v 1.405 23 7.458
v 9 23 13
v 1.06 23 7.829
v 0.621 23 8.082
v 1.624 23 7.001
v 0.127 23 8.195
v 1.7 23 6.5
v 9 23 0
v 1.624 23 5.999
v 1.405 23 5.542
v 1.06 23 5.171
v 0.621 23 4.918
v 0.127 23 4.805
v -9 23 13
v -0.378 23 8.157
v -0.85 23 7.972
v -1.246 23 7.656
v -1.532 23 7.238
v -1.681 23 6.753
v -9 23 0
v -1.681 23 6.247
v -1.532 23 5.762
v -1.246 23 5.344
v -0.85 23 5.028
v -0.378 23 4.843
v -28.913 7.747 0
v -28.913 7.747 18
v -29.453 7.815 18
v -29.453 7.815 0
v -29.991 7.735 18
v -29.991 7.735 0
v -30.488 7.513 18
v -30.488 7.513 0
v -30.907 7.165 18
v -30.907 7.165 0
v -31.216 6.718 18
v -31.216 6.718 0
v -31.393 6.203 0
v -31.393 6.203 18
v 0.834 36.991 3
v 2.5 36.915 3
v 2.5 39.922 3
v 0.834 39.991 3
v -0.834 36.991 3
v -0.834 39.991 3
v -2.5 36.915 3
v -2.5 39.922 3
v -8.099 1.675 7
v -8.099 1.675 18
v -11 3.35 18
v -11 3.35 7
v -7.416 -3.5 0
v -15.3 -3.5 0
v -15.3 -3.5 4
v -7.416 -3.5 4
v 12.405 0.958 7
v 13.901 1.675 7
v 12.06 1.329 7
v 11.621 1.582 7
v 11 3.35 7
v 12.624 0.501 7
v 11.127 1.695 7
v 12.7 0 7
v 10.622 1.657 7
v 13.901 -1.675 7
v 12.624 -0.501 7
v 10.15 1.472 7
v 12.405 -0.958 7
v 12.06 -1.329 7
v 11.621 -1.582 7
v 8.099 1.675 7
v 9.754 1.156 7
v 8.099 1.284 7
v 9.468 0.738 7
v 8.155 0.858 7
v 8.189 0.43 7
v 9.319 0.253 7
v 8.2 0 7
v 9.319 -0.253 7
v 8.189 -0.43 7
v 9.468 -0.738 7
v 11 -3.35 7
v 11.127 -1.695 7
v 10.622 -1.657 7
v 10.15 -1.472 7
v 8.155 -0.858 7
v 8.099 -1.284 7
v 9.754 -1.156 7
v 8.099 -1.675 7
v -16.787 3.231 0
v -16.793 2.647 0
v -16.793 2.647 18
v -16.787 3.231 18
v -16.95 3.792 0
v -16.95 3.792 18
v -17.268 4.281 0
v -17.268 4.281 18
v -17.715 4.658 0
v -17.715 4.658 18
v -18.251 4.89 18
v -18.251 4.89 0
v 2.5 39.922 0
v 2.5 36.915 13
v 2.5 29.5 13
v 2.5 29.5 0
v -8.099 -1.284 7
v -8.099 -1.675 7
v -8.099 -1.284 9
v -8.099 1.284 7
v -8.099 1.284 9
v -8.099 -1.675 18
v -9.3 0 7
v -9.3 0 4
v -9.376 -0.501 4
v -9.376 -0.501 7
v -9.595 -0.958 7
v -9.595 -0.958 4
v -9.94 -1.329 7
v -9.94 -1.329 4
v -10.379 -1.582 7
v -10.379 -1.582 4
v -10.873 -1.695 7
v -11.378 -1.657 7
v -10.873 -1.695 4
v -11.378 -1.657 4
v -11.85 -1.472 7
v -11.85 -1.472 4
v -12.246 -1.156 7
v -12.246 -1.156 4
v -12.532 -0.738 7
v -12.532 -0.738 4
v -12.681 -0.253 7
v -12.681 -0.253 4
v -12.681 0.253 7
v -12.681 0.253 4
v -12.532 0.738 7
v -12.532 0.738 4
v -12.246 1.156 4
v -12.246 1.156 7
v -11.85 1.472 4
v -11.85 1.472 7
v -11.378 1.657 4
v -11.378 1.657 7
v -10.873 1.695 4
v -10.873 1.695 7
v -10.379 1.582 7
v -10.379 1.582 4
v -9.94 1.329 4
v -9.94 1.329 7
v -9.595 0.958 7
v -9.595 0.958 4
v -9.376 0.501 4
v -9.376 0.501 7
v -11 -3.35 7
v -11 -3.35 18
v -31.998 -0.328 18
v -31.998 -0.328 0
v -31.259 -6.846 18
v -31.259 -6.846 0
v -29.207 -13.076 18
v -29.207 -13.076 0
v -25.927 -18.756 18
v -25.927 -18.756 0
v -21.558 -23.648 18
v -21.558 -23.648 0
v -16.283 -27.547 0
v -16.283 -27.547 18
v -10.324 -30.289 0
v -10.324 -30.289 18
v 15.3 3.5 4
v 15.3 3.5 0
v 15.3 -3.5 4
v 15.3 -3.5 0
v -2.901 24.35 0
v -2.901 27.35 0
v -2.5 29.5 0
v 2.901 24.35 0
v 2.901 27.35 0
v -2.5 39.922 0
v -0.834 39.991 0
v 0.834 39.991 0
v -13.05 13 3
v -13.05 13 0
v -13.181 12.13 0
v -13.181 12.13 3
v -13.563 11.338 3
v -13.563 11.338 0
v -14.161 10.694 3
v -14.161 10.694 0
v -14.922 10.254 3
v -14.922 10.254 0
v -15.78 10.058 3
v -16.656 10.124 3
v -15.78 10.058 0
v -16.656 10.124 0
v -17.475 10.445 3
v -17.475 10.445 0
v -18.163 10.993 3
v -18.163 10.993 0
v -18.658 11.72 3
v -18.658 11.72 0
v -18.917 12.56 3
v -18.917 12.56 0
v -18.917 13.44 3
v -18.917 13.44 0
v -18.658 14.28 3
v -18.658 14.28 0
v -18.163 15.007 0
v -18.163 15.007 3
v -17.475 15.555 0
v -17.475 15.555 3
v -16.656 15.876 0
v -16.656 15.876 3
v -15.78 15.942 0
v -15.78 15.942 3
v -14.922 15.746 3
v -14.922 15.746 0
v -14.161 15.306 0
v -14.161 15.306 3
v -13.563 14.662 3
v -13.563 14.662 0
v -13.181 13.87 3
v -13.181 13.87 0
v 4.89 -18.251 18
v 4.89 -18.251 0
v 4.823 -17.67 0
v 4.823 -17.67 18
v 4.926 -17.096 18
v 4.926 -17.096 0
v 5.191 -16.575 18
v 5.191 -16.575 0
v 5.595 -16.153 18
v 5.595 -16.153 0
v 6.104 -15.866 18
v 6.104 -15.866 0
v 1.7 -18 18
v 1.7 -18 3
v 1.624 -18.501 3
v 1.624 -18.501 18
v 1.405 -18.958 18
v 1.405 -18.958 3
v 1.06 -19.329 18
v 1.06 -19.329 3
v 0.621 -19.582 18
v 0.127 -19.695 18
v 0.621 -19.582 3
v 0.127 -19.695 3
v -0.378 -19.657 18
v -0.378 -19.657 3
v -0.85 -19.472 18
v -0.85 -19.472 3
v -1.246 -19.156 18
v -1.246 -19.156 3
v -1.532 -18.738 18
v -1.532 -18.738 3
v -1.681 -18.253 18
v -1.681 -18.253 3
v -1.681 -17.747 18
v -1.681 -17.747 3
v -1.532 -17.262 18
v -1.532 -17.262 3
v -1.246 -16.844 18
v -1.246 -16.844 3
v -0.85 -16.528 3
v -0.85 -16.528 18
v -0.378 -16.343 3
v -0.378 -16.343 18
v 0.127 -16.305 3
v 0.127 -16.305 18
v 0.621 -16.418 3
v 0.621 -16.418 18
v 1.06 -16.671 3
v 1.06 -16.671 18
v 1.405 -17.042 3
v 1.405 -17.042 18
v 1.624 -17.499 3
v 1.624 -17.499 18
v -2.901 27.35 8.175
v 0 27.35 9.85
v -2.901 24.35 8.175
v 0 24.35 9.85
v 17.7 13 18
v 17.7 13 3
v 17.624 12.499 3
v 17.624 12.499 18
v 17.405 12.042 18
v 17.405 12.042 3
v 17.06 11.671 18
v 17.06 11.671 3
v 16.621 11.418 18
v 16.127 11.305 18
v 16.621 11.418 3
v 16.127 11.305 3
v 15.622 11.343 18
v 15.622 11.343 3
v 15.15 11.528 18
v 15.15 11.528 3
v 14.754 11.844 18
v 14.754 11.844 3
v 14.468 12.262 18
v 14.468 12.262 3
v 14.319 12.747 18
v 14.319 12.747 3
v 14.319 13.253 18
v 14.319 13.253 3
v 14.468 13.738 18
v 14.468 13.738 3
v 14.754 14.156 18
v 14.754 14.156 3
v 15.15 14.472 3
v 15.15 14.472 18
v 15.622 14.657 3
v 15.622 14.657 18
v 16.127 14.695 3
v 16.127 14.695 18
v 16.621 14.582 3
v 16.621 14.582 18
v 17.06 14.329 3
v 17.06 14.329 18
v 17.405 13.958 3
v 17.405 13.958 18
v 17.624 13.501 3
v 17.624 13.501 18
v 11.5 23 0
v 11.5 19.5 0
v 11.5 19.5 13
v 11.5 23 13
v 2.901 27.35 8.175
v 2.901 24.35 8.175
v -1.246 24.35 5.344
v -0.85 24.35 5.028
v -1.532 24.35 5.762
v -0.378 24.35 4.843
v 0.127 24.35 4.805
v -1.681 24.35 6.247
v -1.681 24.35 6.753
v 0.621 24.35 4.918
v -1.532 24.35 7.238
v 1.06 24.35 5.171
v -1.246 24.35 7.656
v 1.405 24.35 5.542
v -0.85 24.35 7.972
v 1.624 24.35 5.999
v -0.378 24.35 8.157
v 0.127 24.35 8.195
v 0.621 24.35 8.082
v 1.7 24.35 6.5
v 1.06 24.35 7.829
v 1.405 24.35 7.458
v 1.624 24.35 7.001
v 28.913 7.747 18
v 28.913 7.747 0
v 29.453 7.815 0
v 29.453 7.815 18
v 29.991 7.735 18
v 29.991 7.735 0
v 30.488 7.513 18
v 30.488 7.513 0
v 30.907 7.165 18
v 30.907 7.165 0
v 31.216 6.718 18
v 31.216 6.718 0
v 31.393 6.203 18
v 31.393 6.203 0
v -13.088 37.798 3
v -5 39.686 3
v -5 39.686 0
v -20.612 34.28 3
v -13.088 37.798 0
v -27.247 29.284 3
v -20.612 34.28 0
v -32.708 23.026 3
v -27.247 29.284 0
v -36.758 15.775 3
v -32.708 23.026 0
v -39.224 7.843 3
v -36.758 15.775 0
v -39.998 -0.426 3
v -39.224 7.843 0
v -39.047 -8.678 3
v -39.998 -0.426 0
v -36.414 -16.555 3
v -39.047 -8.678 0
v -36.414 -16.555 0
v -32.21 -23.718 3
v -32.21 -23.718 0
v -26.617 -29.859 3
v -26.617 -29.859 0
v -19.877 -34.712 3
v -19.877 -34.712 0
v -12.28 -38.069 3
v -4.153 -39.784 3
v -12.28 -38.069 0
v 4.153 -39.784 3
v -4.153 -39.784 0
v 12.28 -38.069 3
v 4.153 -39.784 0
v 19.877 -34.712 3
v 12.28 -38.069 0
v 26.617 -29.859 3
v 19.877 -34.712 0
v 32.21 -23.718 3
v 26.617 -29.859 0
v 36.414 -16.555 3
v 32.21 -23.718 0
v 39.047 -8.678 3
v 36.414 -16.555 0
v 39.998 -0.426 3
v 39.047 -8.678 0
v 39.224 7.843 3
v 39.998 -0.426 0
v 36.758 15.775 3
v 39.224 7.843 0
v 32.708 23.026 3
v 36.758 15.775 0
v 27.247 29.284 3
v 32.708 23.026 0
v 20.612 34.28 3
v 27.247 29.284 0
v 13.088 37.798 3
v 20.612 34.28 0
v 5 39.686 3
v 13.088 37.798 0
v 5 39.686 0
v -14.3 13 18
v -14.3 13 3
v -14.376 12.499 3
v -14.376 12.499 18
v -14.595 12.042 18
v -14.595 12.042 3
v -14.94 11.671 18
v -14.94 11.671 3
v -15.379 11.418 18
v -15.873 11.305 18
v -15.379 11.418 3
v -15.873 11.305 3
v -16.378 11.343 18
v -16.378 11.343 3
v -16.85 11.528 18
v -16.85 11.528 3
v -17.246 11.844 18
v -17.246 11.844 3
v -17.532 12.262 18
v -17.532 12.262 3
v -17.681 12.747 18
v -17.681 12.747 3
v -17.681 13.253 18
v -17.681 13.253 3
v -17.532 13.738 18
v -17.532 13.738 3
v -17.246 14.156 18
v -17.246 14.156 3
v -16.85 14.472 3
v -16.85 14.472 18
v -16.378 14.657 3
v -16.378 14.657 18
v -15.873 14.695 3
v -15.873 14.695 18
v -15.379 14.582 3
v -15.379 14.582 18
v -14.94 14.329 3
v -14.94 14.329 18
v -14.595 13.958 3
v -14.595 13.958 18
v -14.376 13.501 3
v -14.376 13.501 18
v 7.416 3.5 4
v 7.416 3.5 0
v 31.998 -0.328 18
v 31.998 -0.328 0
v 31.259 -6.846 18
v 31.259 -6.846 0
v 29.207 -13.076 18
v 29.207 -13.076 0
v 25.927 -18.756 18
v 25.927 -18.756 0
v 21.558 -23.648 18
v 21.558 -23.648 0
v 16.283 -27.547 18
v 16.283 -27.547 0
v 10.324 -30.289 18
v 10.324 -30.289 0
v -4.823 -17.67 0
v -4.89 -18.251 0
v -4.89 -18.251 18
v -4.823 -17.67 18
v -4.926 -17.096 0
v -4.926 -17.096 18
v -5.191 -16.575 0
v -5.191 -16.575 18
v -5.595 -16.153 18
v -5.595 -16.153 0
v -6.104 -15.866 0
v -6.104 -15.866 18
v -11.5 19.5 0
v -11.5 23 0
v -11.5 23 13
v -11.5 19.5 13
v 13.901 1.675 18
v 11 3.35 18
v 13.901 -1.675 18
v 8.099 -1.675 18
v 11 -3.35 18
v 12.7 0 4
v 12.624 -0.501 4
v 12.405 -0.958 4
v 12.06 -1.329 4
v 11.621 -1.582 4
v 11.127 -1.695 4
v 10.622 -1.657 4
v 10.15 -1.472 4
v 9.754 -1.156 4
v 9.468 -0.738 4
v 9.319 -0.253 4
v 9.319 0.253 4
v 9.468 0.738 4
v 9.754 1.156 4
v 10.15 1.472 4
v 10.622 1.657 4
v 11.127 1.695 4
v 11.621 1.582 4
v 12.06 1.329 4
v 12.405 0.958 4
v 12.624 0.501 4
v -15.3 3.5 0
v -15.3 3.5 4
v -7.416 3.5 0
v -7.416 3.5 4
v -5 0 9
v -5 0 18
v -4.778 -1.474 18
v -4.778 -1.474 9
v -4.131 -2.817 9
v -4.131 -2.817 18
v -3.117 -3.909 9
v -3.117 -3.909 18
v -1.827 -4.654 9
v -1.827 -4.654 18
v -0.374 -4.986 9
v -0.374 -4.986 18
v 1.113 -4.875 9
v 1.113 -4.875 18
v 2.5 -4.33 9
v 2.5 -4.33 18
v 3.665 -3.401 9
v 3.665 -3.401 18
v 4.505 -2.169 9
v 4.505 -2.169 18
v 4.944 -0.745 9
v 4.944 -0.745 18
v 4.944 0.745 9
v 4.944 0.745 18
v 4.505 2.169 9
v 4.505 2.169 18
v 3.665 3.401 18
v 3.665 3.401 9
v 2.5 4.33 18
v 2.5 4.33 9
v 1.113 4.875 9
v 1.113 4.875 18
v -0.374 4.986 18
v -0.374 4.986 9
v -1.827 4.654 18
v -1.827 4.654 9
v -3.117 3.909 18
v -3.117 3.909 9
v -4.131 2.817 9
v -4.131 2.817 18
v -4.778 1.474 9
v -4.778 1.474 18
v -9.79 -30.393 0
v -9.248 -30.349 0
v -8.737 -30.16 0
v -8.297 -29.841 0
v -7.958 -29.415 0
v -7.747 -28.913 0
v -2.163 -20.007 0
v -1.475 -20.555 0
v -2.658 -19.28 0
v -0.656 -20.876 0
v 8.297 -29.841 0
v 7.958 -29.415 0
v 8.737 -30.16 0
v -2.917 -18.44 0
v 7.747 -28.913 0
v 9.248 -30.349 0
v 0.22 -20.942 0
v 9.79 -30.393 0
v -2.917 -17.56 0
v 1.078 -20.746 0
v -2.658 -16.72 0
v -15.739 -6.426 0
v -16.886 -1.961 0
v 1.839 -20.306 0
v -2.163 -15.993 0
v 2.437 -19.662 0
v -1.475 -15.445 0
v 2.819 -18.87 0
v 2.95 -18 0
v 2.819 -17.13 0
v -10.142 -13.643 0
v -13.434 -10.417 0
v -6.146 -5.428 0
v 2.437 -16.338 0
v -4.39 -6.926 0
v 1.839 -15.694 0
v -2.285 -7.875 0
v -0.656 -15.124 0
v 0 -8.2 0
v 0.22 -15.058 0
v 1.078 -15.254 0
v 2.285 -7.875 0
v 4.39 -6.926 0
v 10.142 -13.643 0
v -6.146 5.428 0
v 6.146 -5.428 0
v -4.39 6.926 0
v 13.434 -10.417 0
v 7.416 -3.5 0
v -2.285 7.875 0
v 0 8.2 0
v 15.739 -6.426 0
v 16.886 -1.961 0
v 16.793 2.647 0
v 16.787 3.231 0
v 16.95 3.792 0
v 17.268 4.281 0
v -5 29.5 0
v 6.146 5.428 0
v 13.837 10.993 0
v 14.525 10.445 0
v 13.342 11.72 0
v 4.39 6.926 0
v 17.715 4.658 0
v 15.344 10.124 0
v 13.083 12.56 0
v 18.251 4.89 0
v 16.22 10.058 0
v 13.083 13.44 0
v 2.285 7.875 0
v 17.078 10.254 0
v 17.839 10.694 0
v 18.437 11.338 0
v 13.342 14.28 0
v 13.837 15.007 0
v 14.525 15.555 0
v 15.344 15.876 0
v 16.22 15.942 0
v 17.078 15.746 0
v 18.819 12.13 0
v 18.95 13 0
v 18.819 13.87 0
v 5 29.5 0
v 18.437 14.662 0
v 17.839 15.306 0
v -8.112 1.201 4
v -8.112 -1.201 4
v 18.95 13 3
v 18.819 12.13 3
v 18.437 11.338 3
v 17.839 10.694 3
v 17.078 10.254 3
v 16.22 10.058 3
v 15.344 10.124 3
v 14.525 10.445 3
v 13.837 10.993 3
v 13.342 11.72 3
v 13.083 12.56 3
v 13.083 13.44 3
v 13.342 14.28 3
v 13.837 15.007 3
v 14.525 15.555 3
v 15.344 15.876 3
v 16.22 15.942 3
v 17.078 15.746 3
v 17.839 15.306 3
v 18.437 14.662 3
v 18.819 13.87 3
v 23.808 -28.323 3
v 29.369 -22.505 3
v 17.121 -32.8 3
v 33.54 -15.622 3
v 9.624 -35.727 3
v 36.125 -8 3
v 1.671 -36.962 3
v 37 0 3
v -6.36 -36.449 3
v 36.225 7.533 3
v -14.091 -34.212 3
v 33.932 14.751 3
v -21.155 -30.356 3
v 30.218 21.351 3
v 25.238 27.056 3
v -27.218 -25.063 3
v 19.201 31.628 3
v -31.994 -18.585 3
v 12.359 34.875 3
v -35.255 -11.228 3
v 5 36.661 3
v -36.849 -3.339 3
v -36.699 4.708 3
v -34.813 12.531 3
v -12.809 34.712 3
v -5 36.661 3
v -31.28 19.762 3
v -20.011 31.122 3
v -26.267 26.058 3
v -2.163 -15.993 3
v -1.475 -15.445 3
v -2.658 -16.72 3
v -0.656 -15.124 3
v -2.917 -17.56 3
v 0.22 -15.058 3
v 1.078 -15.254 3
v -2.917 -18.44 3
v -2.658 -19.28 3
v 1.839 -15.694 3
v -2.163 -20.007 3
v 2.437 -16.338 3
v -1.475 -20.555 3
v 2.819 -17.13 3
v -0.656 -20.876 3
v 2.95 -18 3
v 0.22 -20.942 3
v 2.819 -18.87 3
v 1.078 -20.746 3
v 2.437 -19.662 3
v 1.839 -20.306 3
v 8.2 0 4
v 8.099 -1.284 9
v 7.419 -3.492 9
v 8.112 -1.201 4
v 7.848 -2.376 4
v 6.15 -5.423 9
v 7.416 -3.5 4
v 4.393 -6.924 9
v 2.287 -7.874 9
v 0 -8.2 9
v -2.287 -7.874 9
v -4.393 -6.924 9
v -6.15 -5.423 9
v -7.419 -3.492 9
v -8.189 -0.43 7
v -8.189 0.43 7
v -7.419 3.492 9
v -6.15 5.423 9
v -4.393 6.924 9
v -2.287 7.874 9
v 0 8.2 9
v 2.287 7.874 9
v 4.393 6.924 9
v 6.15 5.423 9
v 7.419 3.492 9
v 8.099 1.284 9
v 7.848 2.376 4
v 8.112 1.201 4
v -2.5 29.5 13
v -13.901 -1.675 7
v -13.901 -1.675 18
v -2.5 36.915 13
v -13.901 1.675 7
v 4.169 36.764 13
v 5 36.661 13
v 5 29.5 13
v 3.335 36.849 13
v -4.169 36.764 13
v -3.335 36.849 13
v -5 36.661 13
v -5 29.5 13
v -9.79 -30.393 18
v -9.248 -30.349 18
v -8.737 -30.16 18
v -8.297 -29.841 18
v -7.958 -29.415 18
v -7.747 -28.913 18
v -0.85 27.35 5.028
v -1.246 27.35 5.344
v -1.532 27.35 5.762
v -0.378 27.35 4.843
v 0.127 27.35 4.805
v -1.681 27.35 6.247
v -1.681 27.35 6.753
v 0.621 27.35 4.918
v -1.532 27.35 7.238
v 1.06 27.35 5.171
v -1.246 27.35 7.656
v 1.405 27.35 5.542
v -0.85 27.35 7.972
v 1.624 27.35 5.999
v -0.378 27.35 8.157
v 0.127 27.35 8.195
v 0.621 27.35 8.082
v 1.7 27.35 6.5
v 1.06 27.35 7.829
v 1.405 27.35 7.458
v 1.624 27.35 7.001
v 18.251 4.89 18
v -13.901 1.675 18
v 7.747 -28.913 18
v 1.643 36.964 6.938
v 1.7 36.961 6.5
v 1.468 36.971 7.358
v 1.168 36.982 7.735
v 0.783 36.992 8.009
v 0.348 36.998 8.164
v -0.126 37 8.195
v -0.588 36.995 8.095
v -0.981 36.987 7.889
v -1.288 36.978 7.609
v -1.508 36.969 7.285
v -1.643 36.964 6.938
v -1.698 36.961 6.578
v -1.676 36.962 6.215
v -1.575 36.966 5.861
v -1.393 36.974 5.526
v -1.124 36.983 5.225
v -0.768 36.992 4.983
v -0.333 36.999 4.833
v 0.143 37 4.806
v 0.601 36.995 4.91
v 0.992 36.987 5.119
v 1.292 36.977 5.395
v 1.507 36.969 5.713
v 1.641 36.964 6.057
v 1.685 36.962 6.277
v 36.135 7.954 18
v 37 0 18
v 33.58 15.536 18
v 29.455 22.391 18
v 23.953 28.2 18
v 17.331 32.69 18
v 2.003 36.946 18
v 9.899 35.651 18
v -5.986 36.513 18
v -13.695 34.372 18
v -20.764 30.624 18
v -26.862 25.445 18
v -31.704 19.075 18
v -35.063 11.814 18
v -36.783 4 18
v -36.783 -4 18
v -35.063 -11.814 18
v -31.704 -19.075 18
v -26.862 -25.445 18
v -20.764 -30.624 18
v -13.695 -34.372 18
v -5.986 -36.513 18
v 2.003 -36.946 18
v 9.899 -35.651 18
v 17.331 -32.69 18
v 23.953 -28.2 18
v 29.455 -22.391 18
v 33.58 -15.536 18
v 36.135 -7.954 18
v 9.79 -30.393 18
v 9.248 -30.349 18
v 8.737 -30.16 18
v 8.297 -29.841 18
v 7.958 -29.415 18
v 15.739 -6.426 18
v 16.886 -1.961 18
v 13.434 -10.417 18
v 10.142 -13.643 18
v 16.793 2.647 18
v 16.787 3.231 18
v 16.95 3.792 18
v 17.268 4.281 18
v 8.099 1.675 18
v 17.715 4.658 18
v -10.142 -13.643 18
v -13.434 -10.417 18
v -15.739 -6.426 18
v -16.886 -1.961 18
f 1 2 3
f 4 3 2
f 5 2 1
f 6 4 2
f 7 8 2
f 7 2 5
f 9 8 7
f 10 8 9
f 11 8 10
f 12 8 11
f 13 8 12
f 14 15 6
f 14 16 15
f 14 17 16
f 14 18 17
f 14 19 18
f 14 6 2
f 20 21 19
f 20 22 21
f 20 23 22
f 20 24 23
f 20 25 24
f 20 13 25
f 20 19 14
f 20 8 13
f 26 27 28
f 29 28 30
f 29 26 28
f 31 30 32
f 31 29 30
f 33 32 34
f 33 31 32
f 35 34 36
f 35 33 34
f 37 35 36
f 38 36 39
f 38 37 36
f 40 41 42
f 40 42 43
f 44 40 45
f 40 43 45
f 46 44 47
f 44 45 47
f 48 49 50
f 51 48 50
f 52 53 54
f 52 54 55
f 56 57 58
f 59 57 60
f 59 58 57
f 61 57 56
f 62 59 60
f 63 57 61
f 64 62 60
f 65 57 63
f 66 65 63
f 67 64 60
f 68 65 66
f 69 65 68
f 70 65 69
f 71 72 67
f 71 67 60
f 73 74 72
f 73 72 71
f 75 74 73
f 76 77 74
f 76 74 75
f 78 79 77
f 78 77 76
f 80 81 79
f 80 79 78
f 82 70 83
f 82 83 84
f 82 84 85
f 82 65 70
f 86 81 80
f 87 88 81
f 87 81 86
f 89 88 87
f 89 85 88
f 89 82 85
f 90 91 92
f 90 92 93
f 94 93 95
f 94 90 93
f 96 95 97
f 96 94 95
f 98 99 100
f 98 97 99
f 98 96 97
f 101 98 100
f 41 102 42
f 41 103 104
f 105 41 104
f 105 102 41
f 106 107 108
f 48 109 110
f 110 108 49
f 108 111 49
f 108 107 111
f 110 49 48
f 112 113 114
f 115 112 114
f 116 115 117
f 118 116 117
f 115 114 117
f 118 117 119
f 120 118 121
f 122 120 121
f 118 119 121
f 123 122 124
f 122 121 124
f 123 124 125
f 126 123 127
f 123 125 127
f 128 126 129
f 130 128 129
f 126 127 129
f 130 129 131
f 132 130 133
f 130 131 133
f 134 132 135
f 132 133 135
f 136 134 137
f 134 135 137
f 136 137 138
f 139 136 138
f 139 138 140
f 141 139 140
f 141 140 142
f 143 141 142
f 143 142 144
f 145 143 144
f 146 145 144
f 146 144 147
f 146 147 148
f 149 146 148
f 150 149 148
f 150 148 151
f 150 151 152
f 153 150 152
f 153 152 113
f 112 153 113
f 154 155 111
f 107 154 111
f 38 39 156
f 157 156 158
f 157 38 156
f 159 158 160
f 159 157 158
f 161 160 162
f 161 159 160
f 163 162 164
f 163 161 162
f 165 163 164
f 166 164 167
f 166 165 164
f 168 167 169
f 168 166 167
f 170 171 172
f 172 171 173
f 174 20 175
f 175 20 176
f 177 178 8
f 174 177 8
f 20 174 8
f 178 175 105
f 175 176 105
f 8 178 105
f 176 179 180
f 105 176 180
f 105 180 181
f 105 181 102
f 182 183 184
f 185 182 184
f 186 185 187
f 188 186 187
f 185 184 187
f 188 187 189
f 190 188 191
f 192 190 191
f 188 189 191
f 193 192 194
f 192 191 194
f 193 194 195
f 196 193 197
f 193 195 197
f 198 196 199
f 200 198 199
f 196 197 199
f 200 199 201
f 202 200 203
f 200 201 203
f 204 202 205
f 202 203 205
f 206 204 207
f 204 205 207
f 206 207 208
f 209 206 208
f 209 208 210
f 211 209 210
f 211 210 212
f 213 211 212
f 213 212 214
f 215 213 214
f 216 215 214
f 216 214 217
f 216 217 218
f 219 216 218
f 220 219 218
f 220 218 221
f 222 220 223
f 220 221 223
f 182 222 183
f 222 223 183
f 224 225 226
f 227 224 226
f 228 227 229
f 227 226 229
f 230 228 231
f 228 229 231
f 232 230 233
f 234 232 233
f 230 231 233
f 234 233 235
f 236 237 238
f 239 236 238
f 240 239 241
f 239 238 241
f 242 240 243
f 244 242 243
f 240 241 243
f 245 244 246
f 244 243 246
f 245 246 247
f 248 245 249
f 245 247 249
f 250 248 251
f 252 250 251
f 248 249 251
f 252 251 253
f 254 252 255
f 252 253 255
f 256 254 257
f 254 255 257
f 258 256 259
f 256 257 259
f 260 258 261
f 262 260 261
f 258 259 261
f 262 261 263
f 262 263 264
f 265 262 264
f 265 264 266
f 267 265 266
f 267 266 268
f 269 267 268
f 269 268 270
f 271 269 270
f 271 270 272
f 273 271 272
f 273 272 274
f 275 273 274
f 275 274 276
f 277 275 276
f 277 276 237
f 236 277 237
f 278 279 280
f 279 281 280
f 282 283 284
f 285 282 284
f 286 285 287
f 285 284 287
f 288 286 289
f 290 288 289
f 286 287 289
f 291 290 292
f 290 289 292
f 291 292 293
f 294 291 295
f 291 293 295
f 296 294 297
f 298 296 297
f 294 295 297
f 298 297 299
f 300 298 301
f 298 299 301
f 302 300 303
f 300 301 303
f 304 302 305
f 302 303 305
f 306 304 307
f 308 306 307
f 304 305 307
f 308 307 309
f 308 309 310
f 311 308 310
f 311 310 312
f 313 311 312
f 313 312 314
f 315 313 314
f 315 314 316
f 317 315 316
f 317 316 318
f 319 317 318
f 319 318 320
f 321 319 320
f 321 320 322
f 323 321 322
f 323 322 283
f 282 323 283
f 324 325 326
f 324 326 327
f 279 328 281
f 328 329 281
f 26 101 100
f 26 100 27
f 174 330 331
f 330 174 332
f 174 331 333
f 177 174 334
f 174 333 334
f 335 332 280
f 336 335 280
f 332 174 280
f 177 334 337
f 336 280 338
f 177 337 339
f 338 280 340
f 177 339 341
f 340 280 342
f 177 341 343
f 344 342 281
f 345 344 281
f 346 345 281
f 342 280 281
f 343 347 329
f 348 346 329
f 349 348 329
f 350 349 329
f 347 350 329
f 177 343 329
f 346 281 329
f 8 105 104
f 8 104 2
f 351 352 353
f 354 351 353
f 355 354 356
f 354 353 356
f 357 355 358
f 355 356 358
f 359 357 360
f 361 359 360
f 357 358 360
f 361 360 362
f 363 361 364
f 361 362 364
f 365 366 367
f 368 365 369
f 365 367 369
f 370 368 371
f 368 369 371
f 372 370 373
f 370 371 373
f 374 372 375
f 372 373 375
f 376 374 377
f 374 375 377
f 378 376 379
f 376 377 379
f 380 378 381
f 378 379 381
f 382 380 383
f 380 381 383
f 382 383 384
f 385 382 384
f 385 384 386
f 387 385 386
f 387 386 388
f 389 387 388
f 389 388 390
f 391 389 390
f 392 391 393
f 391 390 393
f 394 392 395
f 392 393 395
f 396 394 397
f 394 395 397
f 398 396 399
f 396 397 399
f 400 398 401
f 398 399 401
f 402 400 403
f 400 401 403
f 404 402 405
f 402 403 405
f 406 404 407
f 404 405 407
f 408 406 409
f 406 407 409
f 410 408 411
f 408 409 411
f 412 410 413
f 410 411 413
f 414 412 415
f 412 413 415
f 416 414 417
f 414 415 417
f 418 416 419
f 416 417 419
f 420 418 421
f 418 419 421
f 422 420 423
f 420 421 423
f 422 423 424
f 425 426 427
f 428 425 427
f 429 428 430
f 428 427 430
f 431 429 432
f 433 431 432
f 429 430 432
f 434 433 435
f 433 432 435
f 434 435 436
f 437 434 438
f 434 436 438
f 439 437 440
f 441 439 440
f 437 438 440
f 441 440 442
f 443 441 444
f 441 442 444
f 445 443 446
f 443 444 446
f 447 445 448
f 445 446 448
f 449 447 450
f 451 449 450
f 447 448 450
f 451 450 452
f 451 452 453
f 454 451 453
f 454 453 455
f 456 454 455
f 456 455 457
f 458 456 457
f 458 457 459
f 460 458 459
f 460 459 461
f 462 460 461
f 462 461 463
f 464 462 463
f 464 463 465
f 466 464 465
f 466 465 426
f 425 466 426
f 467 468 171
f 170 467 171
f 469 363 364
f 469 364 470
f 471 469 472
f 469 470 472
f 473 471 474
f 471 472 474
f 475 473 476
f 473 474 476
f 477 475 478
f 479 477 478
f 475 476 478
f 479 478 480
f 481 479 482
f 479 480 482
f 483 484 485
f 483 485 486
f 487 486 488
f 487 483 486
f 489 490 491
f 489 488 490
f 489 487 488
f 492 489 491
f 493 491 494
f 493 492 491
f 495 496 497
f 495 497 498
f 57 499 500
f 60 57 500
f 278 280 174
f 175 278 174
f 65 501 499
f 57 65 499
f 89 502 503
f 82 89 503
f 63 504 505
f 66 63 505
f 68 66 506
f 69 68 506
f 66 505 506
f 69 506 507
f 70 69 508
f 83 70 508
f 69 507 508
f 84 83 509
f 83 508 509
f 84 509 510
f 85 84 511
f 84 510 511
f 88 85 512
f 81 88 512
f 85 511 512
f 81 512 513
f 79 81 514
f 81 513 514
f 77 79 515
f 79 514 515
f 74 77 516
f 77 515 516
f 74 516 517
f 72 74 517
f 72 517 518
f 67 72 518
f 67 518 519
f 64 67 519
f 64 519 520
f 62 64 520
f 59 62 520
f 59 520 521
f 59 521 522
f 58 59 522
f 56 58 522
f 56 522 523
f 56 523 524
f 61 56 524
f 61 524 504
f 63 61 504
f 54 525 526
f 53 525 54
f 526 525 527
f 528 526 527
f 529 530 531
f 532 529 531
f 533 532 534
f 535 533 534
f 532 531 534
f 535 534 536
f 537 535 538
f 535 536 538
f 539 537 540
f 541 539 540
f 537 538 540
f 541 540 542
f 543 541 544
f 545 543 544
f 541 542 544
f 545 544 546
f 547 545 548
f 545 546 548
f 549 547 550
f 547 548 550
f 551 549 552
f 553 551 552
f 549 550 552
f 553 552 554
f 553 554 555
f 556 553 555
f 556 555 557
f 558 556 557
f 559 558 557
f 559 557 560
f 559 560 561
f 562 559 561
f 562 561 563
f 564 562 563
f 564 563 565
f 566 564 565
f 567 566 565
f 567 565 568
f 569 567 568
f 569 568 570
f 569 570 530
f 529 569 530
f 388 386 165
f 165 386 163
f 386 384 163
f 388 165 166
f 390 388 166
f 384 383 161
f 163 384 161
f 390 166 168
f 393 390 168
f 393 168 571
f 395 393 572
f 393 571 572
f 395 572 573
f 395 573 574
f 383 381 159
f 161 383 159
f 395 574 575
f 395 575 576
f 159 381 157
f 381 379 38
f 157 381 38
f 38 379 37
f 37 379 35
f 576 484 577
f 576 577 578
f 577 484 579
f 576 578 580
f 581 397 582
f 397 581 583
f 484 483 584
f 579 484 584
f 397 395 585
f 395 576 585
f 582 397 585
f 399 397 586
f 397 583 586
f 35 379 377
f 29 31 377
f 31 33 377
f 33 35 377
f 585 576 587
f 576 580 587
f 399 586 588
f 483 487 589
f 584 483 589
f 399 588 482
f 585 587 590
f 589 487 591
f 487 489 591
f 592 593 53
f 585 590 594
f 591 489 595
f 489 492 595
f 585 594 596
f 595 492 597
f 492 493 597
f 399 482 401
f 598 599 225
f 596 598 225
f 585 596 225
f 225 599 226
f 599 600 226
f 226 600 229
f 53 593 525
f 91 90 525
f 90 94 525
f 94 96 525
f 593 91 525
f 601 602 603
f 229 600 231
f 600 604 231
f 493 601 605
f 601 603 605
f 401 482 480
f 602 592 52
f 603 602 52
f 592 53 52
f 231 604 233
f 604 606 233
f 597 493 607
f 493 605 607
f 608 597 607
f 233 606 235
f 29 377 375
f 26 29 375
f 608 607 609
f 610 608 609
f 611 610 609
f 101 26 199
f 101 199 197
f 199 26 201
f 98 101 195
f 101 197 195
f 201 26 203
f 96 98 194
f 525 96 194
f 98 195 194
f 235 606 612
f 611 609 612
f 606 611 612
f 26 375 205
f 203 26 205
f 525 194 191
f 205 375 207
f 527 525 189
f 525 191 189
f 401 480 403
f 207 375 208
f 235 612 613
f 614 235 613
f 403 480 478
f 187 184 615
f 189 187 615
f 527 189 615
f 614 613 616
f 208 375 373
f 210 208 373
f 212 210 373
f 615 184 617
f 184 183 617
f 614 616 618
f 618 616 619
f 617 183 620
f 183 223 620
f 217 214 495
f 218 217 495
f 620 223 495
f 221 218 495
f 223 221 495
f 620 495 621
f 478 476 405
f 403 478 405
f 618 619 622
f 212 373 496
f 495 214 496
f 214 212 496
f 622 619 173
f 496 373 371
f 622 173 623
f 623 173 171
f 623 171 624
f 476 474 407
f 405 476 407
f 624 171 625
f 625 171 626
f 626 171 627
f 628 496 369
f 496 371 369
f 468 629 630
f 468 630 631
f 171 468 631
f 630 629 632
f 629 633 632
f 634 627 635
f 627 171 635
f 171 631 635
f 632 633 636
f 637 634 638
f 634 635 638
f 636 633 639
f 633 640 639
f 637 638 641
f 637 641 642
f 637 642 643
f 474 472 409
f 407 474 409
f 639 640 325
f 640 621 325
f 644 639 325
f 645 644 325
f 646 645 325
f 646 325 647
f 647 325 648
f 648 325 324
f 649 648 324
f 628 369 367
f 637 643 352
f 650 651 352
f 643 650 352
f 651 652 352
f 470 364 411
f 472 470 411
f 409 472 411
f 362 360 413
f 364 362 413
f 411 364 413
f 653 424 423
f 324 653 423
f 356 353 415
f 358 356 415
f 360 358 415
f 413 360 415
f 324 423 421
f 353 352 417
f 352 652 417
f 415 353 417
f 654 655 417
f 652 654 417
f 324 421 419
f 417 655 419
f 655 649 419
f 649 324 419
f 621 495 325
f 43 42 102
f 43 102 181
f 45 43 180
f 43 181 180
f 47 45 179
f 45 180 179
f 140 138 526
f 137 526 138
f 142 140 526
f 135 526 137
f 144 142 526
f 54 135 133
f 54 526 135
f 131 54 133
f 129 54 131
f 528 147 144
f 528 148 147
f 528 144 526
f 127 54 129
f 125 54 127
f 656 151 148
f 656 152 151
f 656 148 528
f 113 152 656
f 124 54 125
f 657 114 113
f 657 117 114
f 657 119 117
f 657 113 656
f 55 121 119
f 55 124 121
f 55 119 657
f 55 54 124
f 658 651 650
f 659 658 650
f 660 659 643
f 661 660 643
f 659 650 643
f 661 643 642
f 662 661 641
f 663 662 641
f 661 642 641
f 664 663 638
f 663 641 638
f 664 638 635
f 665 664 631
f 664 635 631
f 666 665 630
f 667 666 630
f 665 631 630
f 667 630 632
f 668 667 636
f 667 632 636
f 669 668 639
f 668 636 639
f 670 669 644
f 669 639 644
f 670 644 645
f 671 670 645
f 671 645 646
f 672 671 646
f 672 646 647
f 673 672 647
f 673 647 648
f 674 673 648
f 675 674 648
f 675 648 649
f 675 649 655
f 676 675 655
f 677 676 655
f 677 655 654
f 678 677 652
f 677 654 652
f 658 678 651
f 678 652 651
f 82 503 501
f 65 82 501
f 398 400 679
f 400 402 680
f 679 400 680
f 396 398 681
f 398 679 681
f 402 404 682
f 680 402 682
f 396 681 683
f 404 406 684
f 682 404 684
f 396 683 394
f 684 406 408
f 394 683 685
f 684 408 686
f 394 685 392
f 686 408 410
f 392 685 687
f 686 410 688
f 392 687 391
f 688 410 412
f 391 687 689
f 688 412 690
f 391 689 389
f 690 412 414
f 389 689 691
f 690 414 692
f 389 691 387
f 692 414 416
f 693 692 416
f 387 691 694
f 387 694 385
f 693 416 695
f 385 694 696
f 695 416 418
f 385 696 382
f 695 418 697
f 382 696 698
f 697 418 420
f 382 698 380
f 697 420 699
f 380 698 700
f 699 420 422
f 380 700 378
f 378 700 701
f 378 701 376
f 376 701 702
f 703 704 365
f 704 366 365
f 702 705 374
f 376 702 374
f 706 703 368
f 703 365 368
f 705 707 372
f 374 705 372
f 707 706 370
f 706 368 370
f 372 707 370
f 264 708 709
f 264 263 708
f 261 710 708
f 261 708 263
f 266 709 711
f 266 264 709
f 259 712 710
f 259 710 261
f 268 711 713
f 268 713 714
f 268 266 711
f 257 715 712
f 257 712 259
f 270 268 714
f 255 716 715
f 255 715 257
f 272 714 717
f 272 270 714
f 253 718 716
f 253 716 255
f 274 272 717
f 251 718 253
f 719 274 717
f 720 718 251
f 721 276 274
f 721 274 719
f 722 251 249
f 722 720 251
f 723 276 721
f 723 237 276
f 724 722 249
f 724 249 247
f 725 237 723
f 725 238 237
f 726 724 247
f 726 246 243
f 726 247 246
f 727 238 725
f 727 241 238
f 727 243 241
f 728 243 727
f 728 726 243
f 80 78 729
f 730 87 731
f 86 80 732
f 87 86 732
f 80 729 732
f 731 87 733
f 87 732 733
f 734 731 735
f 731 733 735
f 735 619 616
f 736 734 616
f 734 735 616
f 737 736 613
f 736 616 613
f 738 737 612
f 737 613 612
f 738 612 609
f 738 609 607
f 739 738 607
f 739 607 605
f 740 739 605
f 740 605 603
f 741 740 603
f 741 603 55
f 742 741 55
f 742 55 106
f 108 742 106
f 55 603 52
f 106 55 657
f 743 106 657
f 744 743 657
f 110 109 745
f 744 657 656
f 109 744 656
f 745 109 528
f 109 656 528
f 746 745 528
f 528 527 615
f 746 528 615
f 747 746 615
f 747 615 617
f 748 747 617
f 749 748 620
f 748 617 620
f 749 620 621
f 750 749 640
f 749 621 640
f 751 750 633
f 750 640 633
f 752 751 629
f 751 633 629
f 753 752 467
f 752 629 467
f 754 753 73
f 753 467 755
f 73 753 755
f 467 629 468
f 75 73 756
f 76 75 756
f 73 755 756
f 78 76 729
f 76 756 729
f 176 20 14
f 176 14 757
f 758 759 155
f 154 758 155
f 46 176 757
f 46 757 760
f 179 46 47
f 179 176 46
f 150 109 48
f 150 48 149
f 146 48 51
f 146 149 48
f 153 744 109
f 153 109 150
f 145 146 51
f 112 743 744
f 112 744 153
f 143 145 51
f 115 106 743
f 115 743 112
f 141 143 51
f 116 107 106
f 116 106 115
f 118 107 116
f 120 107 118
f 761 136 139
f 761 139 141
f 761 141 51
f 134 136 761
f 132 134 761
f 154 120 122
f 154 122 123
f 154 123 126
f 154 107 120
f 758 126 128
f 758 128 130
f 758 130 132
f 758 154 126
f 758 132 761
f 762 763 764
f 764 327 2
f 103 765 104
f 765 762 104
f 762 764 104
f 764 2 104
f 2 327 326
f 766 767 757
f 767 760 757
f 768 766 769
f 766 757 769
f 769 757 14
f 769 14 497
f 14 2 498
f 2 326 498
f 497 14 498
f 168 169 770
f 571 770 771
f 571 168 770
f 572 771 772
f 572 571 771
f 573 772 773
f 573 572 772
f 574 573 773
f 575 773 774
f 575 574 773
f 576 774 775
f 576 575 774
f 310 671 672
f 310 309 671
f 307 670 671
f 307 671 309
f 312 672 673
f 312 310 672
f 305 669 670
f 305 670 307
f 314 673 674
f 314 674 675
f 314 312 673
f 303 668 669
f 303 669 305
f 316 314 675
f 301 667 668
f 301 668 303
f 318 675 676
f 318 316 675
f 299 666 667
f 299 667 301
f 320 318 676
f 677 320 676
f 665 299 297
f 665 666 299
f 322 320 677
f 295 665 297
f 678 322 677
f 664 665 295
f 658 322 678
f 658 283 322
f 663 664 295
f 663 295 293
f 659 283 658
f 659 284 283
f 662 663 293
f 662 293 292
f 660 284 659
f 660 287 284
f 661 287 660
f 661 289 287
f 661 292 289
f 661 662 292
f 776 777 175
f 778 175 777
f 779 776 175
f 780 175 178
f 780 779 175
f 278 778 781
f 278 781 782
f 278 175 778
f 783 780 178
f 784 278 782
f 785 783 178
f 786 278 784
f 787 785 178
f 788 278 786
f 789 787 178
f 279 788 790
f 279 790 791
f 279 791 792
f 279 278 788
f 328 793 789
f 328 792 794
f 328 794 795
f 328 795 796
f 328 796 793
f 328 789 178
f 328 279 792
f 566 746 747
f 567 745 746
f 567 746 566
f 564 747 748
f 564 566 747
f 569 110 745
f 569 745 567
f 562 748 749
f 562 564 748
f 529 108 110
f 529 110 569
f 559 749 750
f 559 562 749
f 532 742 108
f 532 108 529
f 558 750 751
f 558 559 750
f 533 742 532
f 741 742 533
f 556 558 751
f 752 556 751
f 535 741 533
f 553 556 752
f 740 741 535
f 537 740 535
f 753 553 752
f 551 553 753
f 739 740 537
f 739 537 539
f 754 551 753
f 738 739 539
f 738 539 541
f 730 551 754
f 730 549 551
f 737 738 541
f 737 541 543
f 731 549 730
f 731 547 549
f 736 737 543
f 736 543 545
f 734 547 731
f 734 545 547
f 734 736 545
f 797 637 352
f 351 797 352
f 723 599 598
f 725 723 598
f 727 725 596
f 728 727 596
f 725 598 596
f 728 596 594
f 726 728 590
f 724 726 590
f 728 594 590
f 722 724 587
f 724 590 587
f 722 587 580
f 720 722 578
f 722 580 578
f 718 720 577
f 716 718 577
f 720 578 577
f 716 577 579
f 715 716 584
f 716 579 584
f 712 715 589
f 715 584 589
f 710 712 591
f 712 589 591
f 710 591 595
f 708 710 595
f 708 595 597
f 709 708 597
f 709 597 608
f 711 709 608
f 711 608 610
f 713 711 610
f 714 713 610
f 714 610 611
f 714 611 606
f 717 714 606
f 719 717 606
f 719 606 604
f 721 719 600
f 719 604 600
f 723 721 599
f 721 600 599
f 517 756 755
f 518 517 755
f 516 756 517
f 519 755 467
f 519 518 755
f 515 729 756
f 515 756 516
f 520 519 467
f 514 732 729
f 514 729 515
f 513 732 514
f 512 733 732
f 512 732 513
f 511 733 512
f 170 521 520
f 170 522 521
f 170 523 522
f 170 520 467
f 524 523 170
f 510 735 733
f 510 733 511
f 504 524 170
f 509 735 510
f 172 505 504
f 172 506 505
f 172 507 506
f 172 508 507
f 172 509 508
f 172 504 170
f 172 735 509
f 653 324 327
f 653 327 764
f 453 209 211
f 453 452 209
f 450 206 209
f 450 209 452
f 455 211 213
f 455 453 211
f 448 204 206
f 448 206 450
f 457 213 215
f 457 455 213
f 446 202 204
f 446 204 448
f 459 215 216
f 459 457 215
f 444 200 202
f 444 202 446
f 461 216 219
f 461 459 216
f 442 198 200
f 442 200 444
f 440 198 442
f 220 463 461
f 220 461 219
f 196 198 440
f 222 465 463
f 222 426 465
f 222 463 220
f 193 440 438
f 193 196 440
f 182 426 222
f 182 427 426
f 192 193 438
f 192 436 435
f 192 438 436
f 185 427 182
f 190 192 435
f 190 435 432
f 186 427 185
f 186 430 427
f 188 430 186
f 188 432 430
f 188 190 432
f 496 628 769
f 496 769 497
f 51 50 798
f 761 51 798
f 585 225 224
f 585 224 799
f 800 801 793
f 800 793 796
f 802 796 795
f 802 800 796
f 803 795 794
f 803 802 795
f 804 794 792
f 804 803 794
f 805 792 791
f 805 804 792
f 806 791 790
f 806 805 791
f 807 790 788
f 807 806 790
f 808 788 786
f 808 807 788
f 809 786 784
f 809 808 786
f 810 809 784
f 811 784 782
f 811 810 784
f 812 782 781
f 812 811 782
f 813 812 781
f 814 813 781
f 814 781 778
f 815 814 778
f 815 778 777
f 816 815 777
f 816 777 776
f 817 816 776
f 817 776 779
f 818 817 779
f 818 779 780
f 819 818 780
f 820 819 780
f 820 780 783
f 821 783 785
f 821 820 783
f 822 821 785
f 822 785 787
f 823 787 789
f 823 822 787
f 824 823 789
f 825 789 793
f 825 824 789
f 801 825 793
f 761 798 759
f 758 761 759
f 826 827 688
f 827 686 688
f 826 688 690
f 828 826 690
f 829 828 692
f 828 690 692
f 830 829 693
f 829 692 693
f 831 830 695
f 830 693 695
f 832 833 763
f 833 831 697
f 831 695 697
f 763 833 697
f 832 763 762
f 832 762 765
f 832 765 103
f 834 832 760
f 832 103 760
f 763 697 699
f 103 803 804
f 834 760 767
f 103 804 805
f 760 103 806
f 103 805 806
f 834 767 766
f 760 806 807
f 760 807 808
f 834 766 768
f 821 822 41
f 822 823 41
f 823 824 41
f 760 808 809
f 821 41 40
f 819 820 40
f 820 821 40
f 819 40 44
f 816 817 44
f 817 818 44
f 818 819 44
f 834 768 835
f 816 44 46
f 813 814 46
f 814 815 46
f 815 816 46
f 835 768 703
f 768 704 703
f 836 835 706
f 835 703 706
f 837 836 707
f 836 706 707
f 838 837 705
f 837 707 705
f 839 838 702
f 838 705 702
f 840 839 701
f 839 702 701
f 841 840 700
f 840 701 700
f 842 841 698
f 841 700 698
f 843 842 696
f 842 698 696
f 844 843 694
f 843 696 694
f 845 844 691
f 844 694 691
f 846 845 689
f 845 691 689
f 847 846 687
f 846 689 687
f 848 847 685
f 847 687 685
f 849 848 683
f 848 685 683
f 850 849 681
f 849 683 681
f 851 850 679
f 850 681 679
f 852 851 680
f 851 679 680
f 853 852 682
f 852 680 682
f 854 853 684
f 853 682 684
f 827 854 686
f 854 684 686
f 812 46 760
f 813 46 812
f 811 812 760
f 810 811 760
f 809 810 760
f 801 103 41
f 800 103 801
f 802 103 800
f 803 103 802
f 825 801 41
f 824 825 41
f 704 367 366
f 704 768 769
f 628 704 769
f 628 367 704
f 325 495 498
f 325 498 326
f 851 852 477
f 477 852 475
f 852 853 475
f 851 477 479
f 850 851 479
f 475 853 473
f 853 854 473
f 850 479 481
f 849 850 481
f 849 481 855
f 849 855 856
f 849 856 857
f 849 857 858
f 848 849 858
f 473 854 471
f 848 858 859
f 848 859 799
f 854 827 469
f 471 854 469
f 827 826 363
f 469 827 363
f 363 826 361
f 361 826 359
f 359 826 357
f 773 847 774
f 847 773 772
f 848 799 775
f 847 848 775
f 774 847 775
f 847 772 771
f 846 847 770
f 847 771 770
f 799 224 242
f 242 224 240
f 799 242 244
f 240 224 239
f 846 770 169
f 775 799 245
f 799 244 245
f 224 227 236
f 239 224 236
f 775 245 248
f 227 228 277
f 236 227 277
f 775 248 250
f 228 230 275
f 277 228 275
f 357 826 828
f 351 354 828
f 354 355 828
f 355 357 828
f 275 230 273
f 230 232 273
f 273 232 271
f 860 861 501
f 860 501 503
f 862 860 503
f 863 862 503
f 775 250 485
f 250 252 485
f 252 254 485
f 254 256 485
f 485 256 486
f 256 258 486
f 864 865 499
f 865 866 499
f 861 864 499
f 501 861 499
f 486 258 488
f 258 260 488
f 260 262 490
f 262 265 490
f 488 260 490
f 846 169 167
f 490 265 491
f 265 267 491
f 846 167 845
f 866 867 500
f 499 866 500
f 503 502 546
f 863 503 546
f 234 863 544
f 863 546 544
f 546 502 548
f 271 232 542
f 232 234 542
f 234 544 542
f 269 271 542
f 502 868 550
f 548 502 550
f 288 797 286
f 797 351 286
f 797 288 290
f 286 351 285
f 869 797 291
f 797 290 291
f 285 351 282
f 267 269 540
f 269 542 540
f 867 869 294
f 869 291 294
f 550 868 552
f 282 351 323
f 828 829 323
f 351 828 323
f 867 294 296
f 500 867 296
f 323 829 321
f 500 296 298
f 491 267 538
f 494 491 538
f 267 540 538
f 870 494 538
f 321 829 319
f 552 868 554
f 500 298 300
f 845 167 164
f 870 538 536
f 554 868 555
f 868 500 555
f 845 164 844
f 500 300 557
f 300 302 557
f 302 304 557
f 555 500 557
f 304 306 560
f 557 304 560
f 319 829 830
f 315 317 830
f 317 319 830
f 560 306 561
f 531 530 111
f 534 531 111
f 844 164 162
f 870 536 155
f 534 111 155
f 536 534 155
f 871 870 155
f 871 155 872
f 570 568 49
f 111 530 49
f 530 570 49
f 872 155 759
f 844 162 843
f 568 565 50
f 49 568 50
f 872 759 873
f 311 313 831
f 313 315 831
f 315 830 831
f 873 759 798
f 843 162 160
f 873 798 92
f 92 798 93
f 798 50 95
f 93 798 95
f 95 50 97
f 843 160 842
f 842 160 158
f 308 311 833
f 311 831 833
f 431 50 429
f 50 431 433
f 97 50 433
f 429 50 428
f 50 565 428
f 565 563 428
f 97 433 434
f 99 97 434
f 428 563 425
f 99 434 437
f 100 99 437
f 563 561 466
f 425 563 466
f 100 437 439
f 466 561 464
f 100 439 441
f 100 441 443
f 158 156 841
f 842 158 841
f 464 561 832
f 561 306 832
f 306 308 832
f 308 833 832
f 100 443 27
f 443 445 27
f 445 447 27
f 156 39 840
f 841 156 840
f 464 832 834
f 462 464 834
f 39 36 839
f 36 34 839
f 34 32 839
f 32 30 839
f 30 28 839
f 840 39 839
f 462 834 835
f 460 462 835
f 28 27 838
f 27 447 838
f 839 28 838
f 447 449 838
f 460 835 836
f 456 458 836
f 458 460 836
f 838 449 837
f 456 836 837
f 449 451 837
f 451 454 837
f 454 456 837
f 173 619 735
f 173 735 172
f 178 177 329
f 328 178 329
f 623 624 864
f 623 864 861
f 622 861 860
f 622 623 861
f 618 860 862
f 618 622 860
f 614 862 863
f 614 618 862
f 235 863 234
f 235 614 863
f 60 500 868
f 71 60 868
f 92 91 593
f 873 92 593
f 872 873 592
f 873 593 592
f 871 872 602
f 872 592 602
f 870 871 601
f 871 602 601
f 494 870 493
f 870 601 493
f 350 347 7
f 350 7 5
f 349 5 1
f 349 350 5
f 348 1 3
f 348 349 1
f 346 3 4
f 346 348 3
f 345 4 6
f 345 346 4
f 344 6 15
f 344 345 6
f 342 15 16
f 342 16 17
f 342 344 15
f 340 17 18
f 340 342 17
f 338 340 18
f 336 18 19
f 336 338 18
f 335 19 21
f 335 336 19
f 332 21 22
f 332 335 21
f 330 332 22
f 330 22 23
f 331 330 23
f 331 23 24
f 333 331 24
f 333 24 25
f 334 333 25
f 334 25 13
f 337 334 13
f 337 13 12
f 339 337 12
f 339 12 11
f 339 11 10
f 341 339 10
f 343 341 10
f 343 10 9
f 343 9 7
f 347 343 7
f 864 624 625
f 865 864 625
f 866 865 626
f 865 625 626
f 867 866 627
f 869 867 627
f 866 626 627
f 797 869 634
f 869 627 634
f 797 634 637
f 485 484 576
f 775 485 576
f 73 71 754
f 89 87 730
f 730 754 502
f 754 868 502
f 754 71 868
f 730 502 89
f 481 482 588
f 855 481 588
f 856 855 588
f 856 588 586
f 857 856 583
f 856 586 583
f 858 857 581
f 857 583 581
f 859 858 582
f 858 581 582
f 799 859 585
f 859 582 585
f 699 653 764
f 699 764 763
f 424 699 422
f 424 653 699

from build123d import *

# Parameters (mm, degrees)
POCKET_DEPTH    = 13
SKETCH002_R     = 1.7
POCKET001_DEPTH = 17
POCKET002_DEPTH = 1.5
SKETCH004_R     = 5
POCKET003_DEPTH = 18.001
SKETCH005_R     = 8.2
POCKET004_DEPTH = 9
SKETCH006_W     = 30.6
SKETCH006_H     = 7
POCKET005_DEPTH = 4
SKETCH007_R     = 1.7
POCKET006_DEPTH = 14.001
POCKET007_DEPTH = 11
POCKET008_DEPTH = 247.121056
SKETCH010_R     = 1.7
POCKET009_DEPTH = 18.001
SKETCH011_R     = 2.95
POCKET010_DEPTH = 3


with BuildPart() as part:
    # Sketch → Revolution (revolve)
    with BuildSketch(Plane.XZ):
        Polygon((0, 18), (37, 18), (37, 3), (40, 3), (40, 0), (0, 0), align=None)
    revolve(axis=Axis((0, 0, 0), (0, 0, 1)))

    # Sketch001 (on Face5 of Revolution) → Pocket (cut)
    with BuildSketch(Plane(origin=(0, 0, 0), x_dir=(1, 0, 0), z_dir=(0, 0, -1))):
        Polygon((-11.5, -19.5), (11.5, -19.5), (11.5, -23), (5, -29.5), (5, -54.5), (2.5, -54.5), (2.5, -29.5), (9, -23), (-9, -23), (-2.5, -29.5), (-2.5, -54.5), (-5, -54.5), (-5, -29.5), (-11.5, -23), align=None)
    extrude(amount=-POCKET_DEPTH, mode=Mode.SUBTRACT)

    # Sketch002 (on DatumPlane) → Pocket001 (cut)
    with BuildSketch(Plane.XZ.offset(-40)):
        with Locations((0, 6.5)):
            Circle(SKETCH002_R)
    extrude(amount=POCKET001_DEPTH, mode=Mode.SUBTRACT)

    # Sketch003 (on DatumPlane) → Pocket002 (cut, symmetric)
    with BuildSketch(Plane.XZ.offset(-25.85)):
        Polygon((0, 9.85), (-2.901185, 8.175), (-2.901185, -1.825), (2.901185, -1.825), (2.901185, 8.175), align=None)
    extrude(amount=POCKET002_DEPTH, both=True, mode=Mode.SUBTRACT)

    # Sketch004 (on Face1 of Pocket002) → Pocket003 (cut, through all)
    with BuildSketch(Plane(origin=(0, 0, 18), x_dir=(-1, 0, 0), z_dir=(0, 0, 1))):
        Circle(SKETCH004_R)
    extrude(amount=-POCKET003_DEPTH, mode=Mode.SUBTRACT)

    # Sketch005 (on Face12 of Pocket003) → Pocket004 (cut)
    with BuildSketch(Plane(origin=(0, 0, 0), x_dir=(1, 0, 0), z_dir=(0, 0, -1))):
        Circle(SKETCH005_R)
    extrude(amount=-POCKET004_DEPTH, mode=Mode.SUBTRACT)

    # Sketch006 (on Face14 of Pocket004) → Pocket005 (cut)
    with BuildSketch(Plane(origin=(0, 0, 0), x_dir=(1, 0, 0), z_dir=(0, 0, -1))):
        Rectangle(SKETCH006_W, SKETCH006_H)
    extrude(amount=-POCKET005_DEPTH, mode=Mode.SUBTRACT)

    # Sketch007 (on Face39 of Pocket005) → Pocket006 (cut, through all)
    with BuildSketch(Plane(origin=(0, 0, 4), x_dir=(1, 0, 0), z_dir=(0, 0, -1))):
        with Locations((-11, 0)):
            Circle(SKETCH007_R)
        with Locations((11, 0)):
            Circle(SKETCH007_R)
    extrude(amount=-POCKET006_DEPTH, mode=Mode.SUBTRACT)

    # Sketch008 (on Face1 of Pocket006) → Pocket007 (cut)
    with BuildSketch(Plane(origin=(0, 0, 18), x_dir=(-1, 0, 0), z_dir=(0, 0, 1))):
        Polygon((11, 3.35), (8.098815, 1.675), (8.098815, -1.675), (11, -3.35), (13.901185, -1.675), (13.901185, 1.675), align=None)
        Polygon((-11, 3.35), (-13.901185, 1.675), (-13.901185, -1.675), (-11, -3.35), (-8.098815, -1.675), (-8.098815, 1.675), align=None)
    extrude(amount=-POCKET007_DEPTH, mode=Mode.SUBTRACT)

    # Sketch009 (on Face29 of Pocket007) → Pocket008 (cut, through all)
    with BuildSketch(Plane(origin=(0, 0, 0), x_dir=(1, 0, 0), z_dir=(0, 0, -1))):
        with BuildLine():
            ThreePointArc((16.792662, -2.646981), (14.722432, 8.5), (6.103978, 15.866362))
            ThreePointArc((4.890242, 18.250631), (5.039745, 16.82567), (6.103978, 15.866362))
            Line((4.890242, 18.250631), (7.747298, 28.913308))
            ThreePointArc((10.324426, 30.288715), (8.737473, 30.160109), (7.747298, 28.913308))
            ThreePointArc((31.393009, -6.203142), (27.712813, 16), (10.324426, 30.288715))
            ThreePointArc((28.913308, -7.747298), (30.488157, -7.513181), (31.393009, -6.203142))
            Line((18.250631, -4.890242), (28.913308, -7.747298))
            ThreePointArc((16.792662, -2.646981), (17.091331, -4.048288), (18.250631, -4.890242))
        make_face()
    pocket008 = extrude(amount=-POCKET008_DEPTH, mode=Mode.SUBTRACT)

    # Mirrored: Pocket008 across Sketch009 V_Axis
    add(pocket008.mirror(Plane(origin=(0, 0, 0), x_dir=(0, 0, -1), z_dir=(1, 0, 0))), mode=Mode.SUBTRACT)

    # Sketch010 (on Face43 of Mirrored) → Pocket009 (cut, through all)
    with BuildSketch(Plane(origin=(0, 0, 0), x_dir=(1, 0, 0), z_dir=(0, 0, -1))):
        with Locations((0, 18)):
            Circle(SKETCH010_R)
        with Locations((-16, -13)):
            Circle(SKETCH010_R)
        with Locations((16, -13)):
            Circle(SKETCH010_R)
    extrude(amount=-POCKET009_DEPTH, mode=Mode.SUBTRACT)

    # Sketch011 (on Face43 of Pocket009) → Pocket010 (cut)
    with BuildSketch(Plane(origin=(0, 0, 0), x_dir=(1, 0, 0), z_dir=(0, 0, -1))):
        with Locations((0, 18)):
            Circle(SKETCH011_R)
        with Locations((16, -13)):
            Circle(SKETCH011_R)
        with Locations((-16, -13)):
            Circle(SKETCH011_R)
    extrude(amount=-POCKET010_DEPTH, mode=Mode.SUBTRACT)


solid = part.part
